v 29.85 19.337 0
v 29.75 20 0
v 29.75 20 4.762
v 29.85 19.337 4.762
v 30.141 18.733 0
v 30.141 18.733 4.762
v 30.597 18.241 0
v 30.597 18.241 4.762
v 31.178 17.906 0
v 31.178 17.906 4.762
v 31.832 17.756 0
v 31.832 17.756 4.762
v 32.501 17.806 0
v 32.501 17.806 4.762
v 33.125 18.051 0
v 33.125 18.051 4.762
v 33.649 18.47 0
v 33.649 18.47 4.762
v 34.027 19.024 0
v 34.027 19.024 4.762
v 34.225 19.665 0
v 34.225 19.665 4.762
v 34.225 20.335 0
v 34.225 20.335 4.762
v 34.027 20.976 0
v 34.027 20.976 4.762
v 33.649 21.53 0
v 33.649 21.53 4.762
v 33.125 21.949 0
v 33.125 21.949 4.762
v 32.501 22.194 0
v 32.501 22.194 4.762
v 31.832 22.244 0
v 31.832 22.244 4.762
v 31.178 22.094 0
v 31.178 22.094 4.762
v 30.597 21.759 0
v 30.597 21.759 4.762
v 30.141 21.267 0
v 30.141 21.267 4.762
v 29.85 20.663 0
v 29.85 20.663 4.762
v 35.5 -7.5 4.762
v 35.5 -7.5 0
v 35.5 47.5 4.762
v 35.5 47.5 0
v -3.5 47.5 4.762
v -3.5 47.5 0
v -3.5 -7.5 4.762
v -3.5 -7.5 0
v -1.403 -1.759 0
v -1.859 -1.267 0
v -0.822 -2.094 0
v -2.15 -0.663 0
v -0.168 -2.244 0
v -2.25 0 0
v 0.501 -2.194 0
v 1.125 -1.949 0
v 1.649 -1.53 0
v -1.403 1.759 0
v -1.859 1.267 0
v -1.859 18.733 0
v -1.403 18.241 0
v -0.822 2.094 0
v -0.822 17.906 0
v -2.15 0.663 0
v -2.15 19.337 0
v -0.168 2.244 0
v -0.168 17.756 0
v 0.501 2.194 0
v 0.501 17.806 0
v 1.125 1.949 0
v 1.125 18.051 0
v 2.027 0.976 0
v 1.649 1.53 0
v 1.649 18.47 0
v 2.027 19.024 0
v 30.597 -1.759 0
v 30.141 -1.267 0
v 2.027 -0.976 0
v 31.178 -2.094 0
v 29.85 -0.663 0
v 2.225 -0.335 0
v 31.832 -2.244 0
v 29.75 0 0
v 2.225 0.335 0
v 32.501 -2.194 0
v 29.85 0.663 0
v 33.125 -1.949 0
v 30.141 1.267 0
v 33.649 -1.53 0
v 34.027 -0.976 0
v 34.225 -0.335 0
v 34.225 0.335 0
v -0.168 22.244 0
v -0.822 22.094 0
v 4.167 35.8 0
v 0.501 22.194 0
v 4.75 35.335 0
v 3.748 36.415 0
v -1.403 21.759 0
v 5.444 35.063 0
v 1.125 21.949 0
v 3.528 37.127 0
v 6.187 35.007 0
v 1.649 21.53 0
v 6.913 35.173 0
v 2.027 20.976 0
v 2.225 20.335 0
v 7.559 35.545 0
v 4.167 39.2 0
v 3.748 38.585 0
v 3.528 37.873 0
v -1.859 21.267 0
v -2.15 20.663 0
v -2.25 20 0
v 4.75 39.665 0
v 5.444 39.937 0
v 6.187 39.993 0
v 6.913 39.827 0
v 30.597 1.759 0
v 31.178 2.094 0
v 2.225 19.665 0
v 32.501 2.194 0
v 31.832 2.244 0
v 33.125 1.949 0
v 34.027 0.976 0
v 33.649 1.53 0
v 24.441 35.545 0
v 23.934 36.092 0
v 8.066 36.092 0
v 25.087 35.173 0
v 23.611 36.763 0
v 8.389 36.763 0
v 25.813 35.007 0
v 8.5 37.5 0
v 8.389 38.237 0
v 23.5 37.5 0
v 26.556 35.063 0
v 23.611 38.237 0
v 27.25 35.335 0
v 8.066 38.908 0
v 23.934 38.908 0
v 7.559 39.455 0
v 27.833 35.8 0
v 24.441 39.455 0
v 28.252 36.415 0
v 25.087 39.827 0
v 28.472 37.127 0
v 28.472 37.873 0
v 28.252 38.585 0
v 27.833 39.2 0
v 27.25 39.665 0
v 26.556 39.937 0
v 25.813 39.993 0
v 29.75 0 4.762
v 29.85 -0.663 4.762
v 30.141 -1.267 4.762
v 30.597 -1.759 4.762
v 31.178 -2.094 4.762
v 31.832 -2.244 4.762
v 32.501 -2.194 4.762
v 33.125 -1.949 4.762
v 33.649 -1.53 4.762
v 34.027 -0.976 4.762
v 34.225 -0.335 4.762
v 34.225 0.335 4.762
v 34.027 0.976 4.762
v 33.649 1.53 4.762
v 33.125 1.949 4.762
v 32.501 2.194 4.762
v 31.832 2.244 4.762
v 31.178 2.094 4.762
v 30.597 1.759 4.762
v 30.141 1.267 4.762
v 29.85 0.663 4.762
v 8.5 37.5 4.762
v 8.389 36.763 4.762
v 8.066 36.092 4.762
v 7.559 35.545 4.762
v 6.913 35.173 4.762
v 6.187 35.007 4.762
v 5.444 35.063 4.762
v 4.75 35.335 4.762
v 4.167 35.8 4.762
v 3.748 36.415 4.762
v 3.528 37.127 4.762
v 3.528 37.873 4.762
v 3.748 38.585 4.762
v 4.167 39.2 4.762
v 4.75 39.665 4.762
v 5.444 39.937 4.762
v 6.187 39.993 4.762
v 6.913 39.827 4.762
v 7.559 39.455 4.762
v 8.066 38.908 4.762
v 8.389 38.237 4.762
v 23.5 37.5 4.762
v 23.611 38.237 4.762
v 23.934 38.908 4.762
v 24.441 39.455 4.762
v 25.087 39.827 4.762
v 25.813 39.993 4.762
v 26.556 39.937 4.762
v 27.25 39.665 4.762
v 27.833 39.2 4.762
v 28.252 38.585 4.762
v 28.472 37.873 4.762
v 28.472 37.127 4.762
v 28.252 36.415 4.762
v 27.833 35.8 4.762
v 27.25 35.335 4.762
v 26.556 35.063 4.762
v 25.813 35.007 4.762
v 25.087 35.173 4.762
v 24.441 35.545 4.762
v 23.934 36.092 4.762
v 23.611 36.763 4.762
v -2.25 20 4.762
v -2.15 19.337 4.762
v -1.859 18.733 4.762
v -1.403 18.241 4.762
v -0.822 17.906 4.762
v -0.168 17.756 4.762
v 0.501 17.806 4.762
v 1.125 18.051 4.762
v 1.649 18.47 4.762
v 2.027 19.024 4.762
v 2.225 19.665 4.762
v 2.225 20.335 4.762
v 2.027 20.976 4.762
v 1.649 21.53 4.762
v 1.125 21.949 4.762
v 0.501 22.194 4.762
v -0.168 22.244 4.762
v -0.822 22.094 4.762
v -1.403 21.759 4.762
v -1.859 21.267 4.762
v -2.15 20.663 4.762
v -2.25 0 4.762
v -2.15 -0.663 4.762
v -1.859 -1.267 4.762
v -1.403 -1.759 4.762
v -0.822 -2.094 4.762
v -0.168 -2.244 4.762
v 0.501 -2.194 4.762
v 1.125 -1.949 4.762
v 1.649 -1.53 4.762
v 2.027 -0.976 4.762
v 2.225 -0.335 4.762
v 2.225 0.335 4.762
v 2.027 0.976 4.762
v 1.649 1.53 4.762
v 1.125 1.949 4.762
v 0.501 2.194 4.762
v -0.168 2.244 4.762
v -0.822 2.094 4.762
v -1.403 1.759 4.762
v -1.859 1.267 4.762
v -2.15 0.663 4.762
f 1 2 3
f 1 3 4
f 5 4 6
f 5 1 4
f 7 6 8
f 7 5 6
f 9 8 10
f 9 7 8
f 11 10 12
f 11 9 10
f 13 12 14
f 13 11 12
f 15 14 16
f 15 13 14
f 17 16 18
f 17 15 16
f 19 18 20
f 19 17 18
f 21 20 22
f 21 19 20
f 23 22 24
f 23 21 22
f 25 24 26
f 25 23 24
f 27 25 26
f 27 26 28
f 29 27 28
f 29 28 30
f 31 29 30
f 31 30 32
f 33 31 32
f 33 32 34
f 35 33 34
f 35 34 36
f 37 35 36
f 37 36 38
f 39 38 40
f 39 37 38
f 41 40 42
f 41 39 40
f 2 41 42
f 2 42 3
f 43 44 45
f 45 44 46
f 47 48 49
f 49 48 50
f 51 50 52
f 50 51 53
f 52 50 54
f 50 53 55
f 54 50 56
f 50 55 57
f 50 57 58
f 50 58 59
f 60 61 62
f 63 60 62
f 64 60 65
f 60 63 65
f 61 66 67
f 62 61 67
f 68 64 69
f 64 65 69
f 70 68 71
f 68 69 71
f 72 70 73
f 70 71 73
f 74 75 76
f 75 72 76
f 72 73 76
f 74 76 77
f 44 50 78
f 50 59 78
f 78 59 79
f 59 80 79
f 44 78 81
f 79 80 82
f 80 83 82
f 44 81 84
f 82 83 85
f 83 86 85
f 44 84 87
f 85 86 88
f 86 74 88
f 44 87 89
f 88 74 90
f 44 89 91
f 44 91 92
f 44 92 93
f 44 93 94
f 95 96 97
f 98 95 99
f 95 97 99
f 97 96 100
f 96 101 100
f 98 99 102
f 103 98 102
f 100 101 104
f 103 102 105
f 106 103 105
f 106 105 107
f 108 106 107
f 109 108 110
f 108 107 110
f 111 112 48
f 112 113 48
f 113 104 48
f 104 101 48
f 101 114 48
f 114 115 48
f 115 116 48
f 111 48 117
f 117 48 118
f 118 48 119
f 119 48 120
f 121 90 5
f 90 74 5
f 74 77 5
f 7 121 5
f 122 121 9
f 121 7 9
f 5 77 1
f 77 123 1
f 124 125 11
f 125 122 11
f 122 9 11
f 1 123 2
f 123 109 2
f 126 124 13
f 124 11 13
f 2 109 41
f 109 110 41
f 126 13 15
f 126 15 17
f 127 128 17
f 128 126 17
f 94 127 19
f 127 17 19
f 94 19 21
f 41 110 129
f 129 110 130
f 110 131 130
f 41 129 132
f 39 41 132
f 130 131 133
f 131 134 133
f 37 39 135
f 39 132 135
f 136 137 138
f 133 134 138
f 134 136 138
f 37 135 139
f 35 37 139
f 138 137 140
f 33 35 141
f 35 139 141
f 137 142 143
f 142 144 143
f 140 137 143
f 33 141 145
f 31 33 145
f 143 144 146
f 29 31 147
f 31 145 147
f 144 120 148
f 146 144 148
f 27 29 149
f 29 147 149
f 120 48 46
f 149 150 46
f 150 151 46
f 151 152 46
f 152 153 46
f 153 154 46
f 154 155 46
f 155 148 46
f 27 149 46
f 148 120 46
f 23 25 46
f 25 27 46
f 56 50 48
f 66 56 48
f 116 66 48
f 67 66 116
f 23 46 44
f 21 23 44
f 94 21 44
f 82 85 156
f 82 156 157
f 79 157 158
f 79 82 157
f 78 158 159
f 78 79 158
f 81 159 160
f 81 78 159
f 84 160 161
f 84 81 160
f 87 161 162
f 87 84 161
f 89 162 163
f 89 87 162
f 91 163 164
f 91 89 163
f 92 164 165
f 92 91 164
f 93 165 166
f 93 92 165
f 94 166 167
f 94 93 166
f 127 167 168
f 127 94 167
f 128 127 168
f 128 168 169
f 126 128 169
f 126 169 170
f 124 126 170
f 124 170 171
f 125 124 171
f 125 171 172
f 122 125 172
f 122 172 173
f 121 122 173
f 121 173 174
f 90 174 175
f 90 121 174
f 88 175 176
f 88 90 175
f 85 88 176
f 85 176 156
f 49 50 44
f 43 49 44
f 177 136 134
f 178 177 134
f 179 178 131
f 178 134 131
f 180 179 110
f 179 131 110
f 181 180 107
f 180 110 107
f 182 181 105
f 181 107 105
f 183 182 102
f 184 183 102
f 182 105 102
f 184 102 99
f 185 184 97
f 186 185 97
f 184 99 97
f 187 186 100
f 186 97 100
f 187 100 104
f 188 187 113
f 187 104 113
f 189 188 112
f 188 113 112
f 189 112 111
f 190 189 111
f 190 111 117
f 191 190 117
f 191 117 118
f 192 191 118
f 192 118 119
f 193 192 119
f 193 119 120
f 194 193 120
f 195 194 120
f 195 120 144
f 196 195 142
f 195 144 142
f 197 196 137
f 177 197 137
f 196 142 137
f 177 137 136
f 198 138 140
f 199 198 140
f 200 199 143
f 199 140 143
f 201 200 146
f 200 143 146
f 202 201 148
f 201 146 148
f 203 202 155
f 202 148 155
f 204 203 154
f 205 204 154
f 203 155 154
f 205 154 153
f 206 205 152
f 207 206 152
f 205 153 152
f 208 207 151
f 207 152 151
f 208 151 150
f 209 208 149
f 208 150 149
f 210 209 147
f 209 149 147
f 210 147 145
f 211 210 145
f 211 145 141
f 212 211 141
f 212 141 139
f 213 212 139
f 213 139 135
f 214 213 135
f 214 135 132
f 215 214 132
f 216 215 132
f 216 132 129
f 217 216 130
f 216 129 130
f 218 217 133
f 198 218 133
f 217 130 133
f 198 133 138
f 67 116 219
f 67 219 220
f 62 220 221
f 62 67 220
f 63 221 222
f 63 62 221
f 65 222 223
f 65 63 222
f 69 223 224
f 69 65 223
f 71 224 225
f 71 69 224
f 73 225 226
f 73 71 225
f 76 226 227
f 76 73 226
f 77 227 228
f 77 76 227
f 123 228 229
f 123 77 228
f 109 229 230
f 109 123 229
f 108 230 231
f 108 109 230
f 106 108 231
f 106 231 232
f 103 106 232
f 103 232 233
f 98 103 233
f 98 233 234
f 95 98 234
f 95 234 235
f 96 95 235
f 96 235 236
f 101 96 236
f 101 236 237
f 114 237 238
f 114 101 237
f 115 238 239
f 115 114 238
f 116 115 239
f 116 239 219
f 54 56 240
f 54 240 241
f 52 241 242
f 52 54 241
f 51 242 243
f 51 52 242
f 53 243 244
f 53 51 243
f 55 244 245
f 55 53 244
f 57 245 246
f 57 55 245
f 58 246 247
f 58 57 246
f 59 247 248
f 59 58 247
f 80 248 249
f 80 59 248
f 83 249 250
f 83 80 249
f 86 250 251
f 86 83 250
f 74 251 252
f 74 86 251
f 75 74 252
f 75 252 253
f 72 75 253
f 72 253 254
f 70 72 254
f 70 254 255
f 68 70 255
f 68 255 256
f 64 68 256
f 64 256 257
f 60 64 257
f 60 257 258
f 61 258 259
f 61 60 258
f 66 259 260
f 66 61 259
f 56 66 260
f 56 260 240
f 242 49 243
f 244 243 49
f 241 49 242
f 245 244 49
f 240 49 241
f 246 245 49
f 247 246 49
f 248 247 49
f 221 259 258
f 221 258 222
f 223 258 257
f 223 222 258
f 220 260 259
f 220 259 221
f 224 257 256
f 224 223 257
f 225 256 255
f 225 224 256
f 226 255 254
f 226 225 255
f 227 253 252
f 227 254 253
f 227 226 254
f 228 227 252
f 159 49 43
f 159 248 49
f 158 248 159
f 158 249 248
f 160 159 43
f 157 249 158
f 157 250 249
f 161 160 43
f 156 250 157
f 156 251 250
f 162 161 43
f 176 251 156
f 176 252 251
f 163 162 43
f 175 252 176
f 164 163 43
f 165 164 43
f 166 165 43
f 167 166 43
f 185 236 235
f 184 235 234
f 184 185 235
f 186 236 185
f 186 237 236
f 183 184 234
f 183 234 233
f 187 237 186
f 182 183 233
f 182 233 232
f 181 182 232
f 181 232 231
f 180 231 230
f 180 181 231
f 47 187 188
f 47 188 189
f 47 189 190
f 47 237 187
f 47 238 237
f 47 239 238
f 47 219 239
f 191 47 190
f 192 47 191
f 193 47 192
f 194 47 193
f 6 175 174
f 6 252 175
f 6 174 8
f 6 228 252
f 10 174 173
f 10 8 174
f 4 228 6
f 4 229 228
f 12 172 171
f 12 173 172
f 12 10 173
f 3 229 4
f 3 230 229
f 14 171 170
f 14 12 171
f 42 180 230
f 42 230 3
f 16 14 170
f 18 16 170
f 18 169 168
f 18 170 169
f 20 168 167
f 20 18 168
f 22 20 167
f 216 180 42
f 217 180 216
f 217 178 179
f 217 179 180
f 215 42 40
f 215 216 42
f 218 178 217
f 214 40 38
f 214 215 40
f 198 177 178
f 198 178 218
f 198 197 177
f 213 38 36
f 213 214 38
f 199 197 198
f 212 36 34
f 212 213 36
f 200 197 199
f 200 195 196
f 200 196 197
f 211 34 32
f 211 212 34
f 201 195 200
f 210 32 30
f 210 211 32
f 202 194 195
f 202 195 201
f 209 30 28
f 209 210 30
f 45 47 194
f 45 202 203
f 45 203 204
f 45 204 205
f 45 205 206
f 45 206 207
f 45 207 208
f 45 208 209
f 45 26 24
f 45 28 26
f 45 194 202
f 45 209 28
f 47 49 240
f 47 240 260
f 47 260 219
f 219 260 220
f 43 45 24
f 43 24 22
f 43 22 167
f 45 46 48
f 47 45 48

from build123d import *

# Parameters (mm, degrees)
SKETCH1_W           = 39
SKETCH1_H           = 55
SKETCH1_R           = 2.5
SKETCH1_R_2         = 2.25
BOSS_EXTRUDE1_DEPTH = 4.7625


with BuildPart() as part:
    # Sketch1 → Boss-Extrude1 (new body)
    with BuildSketch(Plane.XY):
        with Locations((16, 20)):
            Rectangle(SKETCH1_W, SKETCH1_H)
        with Locations((6, 37.5)):
            Circle(SKETCH1_R, mode=Mode.SUBTRACT)
        with Locations((26, 37.5)):
            Circle(SKETCH1_R, mode=Mode.SUBTRACT)
        Circle(SKETCH1_R_2, mode=Mode.SUBTRACT)
        with Locations((0, 20)):
            Circle(SKETCH1_R_2, mode=Mode.SUBTRACT)
        with Locations((32, 0)):
            Circle(SKETCH1_R_2, mode=Mode.SUBTRACT)
        with Locations((32, 20)):
            Circle(SKETCH1_R_2, mode=Mode.SUBTRACT)
    extrude(amount=BOSS_EXTRUDE1_DEPTH)


solid = part.part
